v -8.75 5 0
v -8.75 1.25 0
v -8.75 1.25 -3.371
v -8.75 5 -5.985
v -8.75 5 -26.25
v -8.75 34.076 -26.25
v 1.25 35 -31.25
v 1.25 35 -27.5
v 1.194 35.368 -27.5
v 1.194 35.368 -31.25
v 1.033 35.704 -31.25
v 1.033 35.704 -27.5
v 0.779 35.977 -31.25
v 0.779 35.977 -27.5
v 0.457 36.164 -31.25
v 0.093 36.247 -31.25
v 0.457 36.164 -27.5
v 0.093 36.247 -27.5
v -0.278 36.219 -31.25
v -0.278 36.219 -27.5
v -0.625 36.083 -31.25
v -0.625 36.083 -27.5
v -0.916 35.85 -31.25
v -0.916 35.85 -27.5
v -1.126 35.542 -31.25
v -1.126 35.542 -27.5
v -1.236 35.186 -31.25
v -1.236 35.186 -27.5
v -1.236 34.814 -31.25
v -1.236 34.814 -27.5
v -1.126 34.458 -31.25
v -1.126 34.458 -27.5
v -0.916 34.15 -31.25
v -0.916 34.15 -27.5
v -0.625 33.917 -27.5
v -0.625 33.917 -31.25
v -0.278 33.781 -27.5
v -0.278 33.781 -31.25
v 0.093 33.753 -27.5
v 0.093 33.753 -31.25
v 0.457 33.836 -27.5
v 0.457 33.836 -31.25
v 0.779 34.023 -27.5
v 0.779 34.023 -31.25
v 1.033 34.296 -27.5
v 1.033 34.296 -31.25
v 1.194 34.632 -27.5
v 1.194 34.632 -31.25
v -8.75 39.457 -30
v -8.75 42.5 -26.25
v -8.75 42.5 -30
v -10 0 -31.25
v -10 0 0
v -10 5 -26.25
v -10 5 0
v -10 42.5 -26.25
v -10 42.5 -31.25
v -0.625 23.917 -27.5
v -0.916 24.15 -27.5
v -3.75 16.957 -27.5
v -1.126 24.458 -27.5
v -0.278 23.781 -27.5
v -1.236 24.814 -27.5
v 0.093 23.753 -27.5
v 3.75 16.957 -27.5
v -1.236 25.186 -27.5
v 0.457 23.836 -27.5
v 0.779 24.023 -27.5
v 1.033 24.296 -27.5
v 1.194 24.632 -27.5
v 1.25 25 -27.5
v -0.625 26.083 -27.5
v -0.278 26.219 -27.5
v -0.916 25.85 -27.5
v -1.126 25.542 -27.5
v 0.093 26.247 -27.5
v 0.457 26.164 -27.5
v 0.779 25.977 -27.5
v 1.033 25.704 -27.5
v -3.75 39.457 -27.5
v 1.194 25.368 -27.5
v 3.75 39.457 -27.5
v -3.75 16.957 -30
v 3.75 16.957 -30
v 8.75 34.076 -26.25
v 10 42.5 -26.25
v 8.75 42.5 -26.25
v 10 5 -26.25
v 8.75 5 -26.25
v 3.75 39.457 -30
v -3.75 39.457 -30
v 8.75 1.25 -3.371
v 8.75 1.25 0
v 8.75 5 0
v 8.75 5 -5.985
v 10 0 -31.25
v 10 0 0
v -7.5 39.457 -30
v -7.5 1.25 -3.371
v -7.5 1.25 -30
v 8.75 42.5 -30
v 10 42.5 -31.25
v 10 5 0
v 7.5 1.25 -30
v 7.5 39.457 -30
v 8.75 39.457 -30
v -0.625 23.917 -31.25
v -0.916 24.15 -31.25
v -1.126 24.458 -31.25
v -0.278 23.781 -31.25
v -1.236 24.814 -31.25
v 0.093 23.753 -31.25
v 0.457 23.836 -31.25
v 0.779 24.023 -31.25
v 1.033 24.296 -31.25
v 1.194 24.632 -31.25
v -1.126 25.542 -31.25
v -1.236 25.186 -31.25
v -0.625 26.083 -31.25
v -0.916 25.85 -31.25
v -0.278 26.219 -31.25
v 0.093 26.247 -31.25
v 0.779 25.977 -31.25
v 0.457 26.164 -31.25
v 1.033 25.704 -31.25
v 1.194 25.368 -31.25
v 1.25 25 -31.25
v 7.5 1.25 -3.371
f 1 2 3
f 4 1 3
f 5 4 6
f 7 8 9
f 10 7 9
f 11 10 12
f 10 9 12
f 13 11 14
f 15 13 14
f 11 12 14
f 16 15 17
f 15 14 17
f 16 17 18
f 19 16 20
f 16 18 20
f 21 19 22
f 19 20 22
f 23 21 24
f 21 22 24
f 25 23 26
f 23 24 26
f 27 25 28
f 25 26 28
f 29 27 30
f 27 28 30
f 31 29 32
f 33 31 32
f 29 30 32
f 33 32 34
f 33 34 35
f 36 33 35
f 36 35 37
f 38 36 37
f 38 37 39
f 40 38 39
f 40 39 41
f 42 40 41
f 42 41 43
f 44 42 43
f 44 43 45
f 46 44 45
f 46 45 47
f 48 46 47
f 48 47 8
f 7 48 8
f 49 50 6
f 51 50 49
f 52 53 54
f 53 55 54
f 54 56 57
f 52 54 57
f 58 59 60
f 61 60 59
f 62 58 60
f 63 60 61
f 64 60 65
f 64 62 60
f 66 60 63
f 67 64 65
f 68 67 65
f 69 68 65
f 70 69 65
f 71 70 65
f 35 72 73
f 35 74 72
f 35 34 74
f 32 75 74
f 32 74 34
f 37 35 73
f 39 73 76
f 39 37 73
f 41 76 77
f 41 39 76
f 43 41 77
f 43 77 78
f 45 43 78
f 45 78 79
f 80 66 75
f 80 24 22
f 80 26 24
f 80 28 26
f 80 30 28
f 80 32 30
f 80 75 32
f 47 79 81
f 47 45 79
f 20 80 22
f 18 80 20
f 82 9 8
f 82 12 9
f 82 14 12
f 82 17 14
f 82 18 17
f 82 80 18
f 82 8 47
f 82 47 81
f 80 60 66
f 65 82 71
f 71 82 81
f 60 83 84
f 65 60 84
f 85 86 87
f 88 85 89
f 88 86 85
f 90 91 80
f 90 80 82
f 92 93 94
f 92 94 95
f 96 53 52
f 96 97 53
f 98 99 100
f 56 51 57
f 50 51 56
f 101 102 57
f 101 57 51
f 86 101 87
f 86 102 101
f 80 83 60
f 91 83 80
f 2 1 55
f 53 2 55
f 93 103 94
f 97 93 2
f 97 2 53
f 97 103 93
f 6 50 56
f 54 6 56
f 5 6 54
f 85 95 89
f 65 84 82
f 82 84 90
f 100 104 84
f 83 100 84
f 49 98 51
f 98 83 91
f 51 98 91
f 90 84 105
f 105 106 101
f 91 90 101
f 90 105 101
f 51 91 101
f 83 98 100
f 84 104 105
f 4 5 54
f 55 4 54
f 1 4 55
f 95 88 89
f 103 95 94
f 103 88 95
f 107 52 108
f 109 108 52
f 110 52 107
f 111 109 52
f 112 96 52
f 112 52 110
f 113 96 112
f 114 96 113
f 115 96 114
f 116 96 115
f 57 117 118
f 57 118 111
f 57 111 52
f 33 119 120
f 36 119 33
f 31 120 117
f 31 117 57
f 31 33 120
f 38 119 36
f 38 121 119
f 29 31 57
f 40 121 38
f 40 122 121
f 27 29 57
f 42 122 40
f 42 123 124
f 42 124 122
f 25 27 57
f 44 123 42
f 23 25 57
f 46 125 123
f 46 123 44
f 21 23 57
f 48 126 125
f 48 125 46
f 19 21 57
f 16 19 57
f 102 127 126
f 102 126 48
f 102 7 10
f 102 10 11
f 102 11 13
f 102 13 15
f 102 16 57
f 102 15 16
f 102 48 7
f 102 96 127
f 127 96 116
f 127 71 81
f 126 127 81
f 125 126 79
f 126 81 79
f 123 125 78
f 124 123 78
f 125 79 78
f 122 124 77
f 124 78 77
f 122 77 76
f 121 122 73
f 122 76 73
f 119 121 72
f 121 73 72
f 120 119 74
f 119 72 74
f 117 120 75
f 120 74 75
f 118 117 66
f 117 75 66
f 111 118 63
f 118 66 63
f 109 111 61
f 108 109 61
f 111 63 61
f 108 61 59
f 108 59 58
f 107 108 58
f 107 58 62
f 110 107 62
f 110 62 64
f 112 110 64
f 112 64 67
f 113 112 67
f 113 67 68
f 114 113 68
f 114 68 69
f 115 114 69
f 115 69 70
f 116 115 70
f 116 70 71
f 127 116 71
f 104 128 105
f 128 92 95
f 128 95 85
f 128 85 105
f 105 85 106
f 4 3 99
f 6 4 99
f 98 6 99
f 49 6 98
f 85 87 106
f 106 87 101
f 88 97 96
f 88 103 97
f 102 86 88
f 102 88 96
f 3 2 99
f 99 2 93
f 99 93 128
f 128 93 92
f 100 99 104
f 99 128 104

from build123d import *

# Parameters (mm, degrees)
BOSS_EXTRUDE1_DEPTH = 10
SHELL1_T            = -1.25
RIB1_REACH          = 57.985
SKETCH4_WALL_W      = 164.251441786
SKETCH4_WALL_H      = 1.25
SKETCH5_W           = 7.5
SKETCH5_H           = 22.5
BOSS_EXTRUDE2_DEPTH = 2.5
SKETCH6_R           = 1.25
CUT_EXTRUDE1_DEPTH  = 52.599418601


with BuildPart() as part:
    # Sketch1 → Boss-Extrude1 (new, symmetric)
    with BuildSketch(Plane(origin=(0, 0, 0), x_dir=(0, 0, -1), z_dir=(1, 0, 0))):
        Polygon((0, 0), (31.25, 0), (31.25, 42.5), (26.25, 42.5), (26.25, 5), (0, 5), align=None)
    extrude(amount=BOSS_EXTRUDE1_DEPTH, both=True)

    # Shell1
    shell1_openings = [part.faces().sort_by_distance(p)[0] for p in [
        (0, 5, -13.125),
        (0, 23.75, -26.25),
        (0, 42.5, -28.75),
        (0, 2.5, 0),
    ]]
    offset(amount=SHELL1_T, openings=shell1_openings, kind=Kind.INTERSECTION)

    # Sketch4 wall → Rib1 (add, up to next)
    with BuildSketch(Plane(origin=(-8.75, 20.625, -16.875), x_dir=(0, 0.82039816677, -0.571792661688), z_dir=(0, 0.571792661688, 0.82039816677)), mode=Mode.PRIVATE) as rib1_sk1:
        with Locations((0, -0.625)):
            Rectangle(SKETCH4_WALL_W, SKETCH4_WALL_H)
    rib1_tool1 = extrude(rib1_sk1.sketch, amount=-RIB1_REACH, mode=Mode.PRIVATE) - part.part
    rib1 = rib1_tool1.solids().sort_by_distance((-8.75, 20.625, -16.875))[0]
    add(rib1)

    # Mirror1: Rib1 across plane
    add(rib1.mirror(Plane(origin=(0, 0, 0), x_dir=(0, 0, 1), z_dir=(1, 0, 0))))

    # Sketch5 → Boss-Extrude2 (add)
    with BuildSketch(Plane.XY.offset(-30)):
        with Locations((0, 28.206521739)):
            Rectangle(SKETCH5_W, SKETCH5_H)
    extrude(amount=BOSS_EXTRUDE2_DEPTH)

    # Sketch6 → Cut-Extrude1 (cut, through all)
    with BuildSketch(Plane.XY.offset(-27.5)):
        with Locations((0, 35)):
            Circle(SKETCH6_R)
        with Locations((0, 25)):
            Circle(SKETCH6_R)
    extrude(amount=-CUT_EXTRUDE1_DEPTH, mode=Mode.SUBTRACT)


solid = part.part
